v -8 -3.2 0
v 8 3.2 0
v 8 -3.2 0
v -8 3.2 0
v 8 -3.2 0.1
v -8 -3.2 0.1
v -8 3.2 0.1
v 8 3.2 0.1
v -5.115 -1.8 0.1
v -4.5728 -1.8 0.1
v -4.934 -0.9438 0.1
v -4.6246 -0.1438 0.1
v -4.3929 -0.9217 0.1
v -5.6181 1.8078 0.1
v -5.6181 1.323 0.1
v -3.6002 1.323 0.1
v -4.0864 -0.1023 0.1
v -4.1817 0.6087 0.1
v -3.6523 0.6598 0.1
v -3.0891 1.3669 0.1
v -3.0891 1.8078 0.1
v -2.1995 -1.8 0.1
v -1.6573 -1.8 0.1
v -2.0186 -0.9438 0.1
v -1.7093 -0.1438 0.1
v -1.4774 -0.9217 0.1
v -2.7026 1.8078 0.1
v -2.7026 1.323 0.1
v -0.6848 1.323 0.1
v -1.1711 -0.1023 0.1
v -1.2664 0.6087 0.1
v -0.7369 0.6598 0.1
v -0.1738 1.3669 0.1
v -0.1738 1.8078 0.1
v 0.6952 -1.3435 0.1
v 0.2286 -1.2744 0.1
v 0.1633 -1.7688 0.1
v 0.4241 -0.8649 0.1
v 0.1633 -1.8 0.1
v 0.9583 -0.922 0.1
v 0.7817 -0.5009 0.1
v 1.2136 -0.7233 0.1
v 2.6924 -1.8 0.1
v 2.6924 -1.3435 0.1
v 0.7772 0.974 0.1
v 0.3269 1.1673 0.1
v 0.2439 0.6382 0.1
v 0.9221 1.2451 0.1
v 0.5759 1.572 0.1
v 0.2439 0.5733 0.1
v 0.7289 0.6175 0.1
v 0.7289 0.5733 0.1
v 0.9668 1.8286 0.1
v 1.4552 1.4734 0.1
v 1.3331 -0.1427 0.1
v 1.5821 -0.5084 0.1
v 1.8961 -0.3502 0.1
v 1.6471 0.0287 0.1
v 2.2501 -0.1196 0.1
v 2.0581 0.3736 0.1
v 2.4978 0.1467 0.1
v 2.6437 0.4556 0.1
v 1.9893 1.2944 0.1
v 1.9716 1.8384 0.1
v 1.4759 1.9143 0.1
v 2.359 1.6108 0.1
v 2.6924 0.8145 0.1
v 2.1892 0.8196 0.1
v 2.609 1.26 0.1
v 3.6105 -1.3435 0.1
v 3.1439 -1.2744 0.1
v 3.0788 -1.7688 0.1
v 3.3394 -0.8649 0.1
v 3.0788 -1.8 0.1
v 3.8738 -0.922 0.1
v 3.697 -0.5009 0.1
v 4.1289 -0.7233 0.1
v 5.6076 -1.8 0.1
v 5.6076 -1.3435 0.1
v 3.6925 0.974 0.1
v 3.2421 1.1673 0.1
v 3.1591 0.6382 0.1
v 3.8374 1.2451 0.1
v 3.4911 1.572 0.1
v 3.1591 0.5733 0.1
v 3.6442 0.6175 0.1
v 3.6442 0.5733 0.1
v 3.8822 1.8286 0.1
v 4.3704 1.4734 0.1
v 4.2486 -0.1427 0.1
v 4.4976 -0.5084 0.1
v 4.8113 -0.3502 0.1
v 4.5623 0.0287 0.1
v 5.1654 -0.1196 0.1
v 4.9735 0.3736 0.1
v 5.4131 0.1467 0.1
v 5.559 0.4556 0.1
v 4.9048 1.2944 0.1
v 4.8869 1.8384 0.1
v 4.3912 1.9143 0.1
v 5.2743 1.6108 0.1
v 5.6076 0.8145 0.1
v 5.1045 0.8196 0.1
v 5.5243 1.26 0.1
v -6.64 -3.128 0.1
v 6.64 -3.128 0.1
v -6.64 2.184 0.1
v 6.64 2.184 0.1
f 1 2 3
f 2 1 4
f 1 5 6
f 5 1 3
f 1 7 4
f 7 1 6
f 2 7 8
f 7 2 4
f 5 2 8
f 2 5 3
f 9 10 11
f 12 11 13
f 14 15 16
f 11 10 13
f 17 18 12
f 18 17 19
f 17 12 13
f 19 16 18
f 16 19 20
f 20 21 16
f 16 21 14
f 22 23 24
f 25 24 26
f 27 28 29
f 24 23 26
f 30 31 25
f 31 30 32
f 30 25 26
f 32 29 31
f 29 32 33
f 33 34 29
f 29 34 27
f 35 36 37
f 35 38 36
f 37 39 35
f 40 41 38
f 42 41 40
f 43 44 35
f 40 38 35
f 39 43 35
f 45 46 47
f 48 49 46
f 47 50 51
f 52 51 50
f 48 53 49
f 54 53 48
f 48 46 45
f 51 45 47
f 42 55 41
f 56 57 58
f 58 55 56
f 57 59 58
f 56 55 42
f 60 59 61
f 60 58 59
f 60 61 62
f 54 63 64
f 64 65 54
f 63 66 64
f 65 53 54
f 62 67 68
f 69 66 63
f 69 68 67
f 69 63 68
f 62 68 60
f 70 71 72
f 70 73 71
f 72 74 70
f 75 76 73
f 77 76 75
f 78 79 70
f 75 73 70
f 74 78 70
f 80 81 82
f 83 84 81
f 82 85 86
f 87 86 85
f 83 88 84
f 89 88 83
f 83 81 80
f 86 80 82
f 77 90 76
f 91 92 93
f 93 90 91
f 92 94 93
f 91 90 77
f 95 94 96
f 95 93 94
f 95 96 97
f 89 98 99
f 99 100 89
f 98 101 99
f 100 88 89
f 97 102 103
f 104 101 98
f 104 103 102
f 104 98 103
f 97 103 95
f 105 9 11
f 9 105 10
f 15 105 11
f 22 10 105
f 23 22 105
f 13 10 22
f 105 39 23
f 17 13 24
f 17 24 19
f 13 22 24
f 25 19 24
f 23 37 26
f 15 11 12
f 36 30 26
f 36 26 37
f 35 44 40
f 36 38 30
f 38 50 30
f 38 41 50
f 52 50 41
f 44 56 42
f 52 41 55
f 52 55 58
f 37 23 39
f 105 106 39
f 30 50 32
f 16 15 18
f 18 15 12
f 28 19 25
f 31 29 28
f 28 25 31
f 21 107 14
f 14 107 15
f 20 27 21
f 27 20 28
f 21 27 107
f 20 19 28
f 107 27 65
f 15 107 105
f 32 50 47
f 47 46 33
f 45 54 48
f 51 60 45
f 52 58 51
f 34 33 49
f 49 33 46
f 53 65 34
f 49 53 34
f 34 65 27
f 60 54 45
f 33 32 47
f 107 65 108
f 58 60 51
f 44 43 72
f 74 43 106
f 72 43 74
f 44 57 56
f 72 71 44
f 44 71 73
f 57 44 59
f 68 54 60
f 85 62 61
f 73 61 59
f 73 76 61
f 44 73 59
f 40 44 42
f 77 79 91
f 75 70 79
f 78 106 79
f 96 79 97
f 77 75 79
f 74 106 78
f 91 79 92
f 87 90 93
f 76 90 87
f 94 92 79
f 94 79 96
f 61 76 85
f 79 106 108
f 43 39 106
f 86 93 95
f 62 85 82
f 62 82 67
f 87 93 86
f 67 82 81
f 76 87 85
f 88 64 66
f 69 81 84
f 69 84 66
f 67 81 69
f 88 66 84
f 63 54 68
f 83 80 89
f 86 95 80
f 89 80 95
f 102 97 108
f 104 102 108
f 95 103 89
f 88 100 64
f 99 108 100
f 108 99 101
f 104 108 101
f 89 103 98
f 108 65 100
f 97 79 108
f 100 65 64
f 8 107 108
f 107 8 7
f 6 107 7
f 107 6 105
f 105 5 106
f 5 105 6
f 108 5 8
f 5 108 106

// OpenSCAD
// file: ../p/box5-12.scad
use <../lib.scad>
function ldraw_lib__box5_12() = [
// 0 Box with 5 Faces without Any Edges
// 0 Name: box5-12.dat
// 0 Author: Chris Dee [cwdee]
// 0 !LDRAW_ORG Primitive UPDATE 2009-02
// 0 !LICENSE Licensed under CC BY 2.0 and CC BY 4.0 : see CAreadme.txt
// 
// 0 BFC CERTIFY CCW
  [0,"BFC","CERTIFY"],
  [0,"BFC","CCW"],
// 
// 0 !HISTORY 2009-09-03 [PTadmin] Official Update 2009-02
// 
// 
// 4 16 1 1 1 1 1 -1 -1 1 -1 -1 1 1
  [4,16,1,1,1,1,1,-1,-1,1,-1,-1,1,1],
// 4 16 -1 0 1 1 0 1 1 1 1 -1 1 1
  [4,16,-1,0,1,1,0,1,1,1,1,-1,1,1],
// 4 16 -1 0 -1 -1 0 1 -1 1 1 -1 1 -1
  [4,16,-1,0,-1,-1,0,1,-1,1,1,-1,1,-1],
// 4 16 1 0 -1 -1 0 -1 -1 1 -1 1 1 -1
  [4,16,1,0,-1,-1,0,-1,-1,1,-1,1,1,-1],
// 4 16 1 0 1 1 0 -1 1 1 -1 1 1 1
  [4,16,1,0,1,1,0,-1,1,1,-1,1,1,1],
// 0
];
module ldraw_lib__box5_12(step=0, col=false, unit=2/5, alt=false, line=0.2, solid=!$preview)
    makepoly(ldraw_lib__box5_12(), step=step, col=col, unit=unit, alt=alt, line=line, solid=solid);
ldraw_lib__box5_12(line=0.2);
// main file
use <../lib.scad>
use <../p/box5-12.scad>
use <s/196935s01.scad>
function ldraw_lib__196935b() = [
// 0 Sticker  0.8 x  2 with White "7722"
// 0 Name: 196935b.dat
// 0 Author: Steffen [Steffen]
// 0 !LDRAW_ORG Part UPDATE 2012-01
// 0 !LICENSE Licensed under CC BY 2.0 and CC BY 4.0 : see CAreadme.txt
// 
// 0 BFC CERTIFY CCW
  [0,"BFC","CERTIFY"],
  [0,"BFC","CCW"],
// 
// 0 !HISTORY 2012-03-30 [PTadmin] Official Update 2012-01
// 
// 
// 1 16 0 -0.25 0 20 0 0 0 0.25 0 0 0 -8 box5-12.dat
  [1,16,0,-0.25,0,20,0,0,0,0.25,0,0,0,-8, ldraw_lib__box5_12()],
// 1 16 0 -0.25 -4.5 0.415 0 0 0 1 0 0 0 0.415 s\196935s01.dat
  [1,16,0,-0.25,-4.5,0.415,0,0,0,1,0,0,0,0.415, ldraw_lib__s__196935s01()],
// 4 16 -20 -0.25 8 -16.6 -0.25 5.46 16.6 -0.25 5.46 20 -0.25 8
  [4,16,-20,-0.25,8,-16.6,-0.25,5.46,16.6,-0.25,5.46,20,-0.25,8],
// 4 16 -16.6 -0.25 5.46 -20 -0.25 8 -20 -0.25 -8 -16.6 -0.25 -7.82
  [4,16,-16.6,-0.25,5.46,-20,-0.25,8,-20,-0.25,-8,-16.6,-0.25,-7.82],
// 4 16 -16.6 -0.25 -7.82 -20 -0.25 -8 20 -0.25 -8 16.6 -0.25 -7.82
  [4,16,-16.6,-0.25,-7.82,-20,-0.25,-8,20,-0.25,-8,16.6,-0.25,-7.82],
// 4 16 20 -0.25 8 16.6 -0.25 5.46 16.6 -0.25 -7.82 20 -0.25 -8
  [4,16,20,-0.25,8,16.6,-0.25,5.46,16.6,-0.25,-7.82,20,-0.25,-8],
];
module ldraw_lib__196935b(step=0, col=false, unit=2/5, alt=false, line=0.2, solid=!$preview)
    makepoly(ldraw_lib__196935b(), step=step, col=col, unit=unit, alt=alt, line=line, solid=solid);
ldraw_lib__196935b(line=0.2);
